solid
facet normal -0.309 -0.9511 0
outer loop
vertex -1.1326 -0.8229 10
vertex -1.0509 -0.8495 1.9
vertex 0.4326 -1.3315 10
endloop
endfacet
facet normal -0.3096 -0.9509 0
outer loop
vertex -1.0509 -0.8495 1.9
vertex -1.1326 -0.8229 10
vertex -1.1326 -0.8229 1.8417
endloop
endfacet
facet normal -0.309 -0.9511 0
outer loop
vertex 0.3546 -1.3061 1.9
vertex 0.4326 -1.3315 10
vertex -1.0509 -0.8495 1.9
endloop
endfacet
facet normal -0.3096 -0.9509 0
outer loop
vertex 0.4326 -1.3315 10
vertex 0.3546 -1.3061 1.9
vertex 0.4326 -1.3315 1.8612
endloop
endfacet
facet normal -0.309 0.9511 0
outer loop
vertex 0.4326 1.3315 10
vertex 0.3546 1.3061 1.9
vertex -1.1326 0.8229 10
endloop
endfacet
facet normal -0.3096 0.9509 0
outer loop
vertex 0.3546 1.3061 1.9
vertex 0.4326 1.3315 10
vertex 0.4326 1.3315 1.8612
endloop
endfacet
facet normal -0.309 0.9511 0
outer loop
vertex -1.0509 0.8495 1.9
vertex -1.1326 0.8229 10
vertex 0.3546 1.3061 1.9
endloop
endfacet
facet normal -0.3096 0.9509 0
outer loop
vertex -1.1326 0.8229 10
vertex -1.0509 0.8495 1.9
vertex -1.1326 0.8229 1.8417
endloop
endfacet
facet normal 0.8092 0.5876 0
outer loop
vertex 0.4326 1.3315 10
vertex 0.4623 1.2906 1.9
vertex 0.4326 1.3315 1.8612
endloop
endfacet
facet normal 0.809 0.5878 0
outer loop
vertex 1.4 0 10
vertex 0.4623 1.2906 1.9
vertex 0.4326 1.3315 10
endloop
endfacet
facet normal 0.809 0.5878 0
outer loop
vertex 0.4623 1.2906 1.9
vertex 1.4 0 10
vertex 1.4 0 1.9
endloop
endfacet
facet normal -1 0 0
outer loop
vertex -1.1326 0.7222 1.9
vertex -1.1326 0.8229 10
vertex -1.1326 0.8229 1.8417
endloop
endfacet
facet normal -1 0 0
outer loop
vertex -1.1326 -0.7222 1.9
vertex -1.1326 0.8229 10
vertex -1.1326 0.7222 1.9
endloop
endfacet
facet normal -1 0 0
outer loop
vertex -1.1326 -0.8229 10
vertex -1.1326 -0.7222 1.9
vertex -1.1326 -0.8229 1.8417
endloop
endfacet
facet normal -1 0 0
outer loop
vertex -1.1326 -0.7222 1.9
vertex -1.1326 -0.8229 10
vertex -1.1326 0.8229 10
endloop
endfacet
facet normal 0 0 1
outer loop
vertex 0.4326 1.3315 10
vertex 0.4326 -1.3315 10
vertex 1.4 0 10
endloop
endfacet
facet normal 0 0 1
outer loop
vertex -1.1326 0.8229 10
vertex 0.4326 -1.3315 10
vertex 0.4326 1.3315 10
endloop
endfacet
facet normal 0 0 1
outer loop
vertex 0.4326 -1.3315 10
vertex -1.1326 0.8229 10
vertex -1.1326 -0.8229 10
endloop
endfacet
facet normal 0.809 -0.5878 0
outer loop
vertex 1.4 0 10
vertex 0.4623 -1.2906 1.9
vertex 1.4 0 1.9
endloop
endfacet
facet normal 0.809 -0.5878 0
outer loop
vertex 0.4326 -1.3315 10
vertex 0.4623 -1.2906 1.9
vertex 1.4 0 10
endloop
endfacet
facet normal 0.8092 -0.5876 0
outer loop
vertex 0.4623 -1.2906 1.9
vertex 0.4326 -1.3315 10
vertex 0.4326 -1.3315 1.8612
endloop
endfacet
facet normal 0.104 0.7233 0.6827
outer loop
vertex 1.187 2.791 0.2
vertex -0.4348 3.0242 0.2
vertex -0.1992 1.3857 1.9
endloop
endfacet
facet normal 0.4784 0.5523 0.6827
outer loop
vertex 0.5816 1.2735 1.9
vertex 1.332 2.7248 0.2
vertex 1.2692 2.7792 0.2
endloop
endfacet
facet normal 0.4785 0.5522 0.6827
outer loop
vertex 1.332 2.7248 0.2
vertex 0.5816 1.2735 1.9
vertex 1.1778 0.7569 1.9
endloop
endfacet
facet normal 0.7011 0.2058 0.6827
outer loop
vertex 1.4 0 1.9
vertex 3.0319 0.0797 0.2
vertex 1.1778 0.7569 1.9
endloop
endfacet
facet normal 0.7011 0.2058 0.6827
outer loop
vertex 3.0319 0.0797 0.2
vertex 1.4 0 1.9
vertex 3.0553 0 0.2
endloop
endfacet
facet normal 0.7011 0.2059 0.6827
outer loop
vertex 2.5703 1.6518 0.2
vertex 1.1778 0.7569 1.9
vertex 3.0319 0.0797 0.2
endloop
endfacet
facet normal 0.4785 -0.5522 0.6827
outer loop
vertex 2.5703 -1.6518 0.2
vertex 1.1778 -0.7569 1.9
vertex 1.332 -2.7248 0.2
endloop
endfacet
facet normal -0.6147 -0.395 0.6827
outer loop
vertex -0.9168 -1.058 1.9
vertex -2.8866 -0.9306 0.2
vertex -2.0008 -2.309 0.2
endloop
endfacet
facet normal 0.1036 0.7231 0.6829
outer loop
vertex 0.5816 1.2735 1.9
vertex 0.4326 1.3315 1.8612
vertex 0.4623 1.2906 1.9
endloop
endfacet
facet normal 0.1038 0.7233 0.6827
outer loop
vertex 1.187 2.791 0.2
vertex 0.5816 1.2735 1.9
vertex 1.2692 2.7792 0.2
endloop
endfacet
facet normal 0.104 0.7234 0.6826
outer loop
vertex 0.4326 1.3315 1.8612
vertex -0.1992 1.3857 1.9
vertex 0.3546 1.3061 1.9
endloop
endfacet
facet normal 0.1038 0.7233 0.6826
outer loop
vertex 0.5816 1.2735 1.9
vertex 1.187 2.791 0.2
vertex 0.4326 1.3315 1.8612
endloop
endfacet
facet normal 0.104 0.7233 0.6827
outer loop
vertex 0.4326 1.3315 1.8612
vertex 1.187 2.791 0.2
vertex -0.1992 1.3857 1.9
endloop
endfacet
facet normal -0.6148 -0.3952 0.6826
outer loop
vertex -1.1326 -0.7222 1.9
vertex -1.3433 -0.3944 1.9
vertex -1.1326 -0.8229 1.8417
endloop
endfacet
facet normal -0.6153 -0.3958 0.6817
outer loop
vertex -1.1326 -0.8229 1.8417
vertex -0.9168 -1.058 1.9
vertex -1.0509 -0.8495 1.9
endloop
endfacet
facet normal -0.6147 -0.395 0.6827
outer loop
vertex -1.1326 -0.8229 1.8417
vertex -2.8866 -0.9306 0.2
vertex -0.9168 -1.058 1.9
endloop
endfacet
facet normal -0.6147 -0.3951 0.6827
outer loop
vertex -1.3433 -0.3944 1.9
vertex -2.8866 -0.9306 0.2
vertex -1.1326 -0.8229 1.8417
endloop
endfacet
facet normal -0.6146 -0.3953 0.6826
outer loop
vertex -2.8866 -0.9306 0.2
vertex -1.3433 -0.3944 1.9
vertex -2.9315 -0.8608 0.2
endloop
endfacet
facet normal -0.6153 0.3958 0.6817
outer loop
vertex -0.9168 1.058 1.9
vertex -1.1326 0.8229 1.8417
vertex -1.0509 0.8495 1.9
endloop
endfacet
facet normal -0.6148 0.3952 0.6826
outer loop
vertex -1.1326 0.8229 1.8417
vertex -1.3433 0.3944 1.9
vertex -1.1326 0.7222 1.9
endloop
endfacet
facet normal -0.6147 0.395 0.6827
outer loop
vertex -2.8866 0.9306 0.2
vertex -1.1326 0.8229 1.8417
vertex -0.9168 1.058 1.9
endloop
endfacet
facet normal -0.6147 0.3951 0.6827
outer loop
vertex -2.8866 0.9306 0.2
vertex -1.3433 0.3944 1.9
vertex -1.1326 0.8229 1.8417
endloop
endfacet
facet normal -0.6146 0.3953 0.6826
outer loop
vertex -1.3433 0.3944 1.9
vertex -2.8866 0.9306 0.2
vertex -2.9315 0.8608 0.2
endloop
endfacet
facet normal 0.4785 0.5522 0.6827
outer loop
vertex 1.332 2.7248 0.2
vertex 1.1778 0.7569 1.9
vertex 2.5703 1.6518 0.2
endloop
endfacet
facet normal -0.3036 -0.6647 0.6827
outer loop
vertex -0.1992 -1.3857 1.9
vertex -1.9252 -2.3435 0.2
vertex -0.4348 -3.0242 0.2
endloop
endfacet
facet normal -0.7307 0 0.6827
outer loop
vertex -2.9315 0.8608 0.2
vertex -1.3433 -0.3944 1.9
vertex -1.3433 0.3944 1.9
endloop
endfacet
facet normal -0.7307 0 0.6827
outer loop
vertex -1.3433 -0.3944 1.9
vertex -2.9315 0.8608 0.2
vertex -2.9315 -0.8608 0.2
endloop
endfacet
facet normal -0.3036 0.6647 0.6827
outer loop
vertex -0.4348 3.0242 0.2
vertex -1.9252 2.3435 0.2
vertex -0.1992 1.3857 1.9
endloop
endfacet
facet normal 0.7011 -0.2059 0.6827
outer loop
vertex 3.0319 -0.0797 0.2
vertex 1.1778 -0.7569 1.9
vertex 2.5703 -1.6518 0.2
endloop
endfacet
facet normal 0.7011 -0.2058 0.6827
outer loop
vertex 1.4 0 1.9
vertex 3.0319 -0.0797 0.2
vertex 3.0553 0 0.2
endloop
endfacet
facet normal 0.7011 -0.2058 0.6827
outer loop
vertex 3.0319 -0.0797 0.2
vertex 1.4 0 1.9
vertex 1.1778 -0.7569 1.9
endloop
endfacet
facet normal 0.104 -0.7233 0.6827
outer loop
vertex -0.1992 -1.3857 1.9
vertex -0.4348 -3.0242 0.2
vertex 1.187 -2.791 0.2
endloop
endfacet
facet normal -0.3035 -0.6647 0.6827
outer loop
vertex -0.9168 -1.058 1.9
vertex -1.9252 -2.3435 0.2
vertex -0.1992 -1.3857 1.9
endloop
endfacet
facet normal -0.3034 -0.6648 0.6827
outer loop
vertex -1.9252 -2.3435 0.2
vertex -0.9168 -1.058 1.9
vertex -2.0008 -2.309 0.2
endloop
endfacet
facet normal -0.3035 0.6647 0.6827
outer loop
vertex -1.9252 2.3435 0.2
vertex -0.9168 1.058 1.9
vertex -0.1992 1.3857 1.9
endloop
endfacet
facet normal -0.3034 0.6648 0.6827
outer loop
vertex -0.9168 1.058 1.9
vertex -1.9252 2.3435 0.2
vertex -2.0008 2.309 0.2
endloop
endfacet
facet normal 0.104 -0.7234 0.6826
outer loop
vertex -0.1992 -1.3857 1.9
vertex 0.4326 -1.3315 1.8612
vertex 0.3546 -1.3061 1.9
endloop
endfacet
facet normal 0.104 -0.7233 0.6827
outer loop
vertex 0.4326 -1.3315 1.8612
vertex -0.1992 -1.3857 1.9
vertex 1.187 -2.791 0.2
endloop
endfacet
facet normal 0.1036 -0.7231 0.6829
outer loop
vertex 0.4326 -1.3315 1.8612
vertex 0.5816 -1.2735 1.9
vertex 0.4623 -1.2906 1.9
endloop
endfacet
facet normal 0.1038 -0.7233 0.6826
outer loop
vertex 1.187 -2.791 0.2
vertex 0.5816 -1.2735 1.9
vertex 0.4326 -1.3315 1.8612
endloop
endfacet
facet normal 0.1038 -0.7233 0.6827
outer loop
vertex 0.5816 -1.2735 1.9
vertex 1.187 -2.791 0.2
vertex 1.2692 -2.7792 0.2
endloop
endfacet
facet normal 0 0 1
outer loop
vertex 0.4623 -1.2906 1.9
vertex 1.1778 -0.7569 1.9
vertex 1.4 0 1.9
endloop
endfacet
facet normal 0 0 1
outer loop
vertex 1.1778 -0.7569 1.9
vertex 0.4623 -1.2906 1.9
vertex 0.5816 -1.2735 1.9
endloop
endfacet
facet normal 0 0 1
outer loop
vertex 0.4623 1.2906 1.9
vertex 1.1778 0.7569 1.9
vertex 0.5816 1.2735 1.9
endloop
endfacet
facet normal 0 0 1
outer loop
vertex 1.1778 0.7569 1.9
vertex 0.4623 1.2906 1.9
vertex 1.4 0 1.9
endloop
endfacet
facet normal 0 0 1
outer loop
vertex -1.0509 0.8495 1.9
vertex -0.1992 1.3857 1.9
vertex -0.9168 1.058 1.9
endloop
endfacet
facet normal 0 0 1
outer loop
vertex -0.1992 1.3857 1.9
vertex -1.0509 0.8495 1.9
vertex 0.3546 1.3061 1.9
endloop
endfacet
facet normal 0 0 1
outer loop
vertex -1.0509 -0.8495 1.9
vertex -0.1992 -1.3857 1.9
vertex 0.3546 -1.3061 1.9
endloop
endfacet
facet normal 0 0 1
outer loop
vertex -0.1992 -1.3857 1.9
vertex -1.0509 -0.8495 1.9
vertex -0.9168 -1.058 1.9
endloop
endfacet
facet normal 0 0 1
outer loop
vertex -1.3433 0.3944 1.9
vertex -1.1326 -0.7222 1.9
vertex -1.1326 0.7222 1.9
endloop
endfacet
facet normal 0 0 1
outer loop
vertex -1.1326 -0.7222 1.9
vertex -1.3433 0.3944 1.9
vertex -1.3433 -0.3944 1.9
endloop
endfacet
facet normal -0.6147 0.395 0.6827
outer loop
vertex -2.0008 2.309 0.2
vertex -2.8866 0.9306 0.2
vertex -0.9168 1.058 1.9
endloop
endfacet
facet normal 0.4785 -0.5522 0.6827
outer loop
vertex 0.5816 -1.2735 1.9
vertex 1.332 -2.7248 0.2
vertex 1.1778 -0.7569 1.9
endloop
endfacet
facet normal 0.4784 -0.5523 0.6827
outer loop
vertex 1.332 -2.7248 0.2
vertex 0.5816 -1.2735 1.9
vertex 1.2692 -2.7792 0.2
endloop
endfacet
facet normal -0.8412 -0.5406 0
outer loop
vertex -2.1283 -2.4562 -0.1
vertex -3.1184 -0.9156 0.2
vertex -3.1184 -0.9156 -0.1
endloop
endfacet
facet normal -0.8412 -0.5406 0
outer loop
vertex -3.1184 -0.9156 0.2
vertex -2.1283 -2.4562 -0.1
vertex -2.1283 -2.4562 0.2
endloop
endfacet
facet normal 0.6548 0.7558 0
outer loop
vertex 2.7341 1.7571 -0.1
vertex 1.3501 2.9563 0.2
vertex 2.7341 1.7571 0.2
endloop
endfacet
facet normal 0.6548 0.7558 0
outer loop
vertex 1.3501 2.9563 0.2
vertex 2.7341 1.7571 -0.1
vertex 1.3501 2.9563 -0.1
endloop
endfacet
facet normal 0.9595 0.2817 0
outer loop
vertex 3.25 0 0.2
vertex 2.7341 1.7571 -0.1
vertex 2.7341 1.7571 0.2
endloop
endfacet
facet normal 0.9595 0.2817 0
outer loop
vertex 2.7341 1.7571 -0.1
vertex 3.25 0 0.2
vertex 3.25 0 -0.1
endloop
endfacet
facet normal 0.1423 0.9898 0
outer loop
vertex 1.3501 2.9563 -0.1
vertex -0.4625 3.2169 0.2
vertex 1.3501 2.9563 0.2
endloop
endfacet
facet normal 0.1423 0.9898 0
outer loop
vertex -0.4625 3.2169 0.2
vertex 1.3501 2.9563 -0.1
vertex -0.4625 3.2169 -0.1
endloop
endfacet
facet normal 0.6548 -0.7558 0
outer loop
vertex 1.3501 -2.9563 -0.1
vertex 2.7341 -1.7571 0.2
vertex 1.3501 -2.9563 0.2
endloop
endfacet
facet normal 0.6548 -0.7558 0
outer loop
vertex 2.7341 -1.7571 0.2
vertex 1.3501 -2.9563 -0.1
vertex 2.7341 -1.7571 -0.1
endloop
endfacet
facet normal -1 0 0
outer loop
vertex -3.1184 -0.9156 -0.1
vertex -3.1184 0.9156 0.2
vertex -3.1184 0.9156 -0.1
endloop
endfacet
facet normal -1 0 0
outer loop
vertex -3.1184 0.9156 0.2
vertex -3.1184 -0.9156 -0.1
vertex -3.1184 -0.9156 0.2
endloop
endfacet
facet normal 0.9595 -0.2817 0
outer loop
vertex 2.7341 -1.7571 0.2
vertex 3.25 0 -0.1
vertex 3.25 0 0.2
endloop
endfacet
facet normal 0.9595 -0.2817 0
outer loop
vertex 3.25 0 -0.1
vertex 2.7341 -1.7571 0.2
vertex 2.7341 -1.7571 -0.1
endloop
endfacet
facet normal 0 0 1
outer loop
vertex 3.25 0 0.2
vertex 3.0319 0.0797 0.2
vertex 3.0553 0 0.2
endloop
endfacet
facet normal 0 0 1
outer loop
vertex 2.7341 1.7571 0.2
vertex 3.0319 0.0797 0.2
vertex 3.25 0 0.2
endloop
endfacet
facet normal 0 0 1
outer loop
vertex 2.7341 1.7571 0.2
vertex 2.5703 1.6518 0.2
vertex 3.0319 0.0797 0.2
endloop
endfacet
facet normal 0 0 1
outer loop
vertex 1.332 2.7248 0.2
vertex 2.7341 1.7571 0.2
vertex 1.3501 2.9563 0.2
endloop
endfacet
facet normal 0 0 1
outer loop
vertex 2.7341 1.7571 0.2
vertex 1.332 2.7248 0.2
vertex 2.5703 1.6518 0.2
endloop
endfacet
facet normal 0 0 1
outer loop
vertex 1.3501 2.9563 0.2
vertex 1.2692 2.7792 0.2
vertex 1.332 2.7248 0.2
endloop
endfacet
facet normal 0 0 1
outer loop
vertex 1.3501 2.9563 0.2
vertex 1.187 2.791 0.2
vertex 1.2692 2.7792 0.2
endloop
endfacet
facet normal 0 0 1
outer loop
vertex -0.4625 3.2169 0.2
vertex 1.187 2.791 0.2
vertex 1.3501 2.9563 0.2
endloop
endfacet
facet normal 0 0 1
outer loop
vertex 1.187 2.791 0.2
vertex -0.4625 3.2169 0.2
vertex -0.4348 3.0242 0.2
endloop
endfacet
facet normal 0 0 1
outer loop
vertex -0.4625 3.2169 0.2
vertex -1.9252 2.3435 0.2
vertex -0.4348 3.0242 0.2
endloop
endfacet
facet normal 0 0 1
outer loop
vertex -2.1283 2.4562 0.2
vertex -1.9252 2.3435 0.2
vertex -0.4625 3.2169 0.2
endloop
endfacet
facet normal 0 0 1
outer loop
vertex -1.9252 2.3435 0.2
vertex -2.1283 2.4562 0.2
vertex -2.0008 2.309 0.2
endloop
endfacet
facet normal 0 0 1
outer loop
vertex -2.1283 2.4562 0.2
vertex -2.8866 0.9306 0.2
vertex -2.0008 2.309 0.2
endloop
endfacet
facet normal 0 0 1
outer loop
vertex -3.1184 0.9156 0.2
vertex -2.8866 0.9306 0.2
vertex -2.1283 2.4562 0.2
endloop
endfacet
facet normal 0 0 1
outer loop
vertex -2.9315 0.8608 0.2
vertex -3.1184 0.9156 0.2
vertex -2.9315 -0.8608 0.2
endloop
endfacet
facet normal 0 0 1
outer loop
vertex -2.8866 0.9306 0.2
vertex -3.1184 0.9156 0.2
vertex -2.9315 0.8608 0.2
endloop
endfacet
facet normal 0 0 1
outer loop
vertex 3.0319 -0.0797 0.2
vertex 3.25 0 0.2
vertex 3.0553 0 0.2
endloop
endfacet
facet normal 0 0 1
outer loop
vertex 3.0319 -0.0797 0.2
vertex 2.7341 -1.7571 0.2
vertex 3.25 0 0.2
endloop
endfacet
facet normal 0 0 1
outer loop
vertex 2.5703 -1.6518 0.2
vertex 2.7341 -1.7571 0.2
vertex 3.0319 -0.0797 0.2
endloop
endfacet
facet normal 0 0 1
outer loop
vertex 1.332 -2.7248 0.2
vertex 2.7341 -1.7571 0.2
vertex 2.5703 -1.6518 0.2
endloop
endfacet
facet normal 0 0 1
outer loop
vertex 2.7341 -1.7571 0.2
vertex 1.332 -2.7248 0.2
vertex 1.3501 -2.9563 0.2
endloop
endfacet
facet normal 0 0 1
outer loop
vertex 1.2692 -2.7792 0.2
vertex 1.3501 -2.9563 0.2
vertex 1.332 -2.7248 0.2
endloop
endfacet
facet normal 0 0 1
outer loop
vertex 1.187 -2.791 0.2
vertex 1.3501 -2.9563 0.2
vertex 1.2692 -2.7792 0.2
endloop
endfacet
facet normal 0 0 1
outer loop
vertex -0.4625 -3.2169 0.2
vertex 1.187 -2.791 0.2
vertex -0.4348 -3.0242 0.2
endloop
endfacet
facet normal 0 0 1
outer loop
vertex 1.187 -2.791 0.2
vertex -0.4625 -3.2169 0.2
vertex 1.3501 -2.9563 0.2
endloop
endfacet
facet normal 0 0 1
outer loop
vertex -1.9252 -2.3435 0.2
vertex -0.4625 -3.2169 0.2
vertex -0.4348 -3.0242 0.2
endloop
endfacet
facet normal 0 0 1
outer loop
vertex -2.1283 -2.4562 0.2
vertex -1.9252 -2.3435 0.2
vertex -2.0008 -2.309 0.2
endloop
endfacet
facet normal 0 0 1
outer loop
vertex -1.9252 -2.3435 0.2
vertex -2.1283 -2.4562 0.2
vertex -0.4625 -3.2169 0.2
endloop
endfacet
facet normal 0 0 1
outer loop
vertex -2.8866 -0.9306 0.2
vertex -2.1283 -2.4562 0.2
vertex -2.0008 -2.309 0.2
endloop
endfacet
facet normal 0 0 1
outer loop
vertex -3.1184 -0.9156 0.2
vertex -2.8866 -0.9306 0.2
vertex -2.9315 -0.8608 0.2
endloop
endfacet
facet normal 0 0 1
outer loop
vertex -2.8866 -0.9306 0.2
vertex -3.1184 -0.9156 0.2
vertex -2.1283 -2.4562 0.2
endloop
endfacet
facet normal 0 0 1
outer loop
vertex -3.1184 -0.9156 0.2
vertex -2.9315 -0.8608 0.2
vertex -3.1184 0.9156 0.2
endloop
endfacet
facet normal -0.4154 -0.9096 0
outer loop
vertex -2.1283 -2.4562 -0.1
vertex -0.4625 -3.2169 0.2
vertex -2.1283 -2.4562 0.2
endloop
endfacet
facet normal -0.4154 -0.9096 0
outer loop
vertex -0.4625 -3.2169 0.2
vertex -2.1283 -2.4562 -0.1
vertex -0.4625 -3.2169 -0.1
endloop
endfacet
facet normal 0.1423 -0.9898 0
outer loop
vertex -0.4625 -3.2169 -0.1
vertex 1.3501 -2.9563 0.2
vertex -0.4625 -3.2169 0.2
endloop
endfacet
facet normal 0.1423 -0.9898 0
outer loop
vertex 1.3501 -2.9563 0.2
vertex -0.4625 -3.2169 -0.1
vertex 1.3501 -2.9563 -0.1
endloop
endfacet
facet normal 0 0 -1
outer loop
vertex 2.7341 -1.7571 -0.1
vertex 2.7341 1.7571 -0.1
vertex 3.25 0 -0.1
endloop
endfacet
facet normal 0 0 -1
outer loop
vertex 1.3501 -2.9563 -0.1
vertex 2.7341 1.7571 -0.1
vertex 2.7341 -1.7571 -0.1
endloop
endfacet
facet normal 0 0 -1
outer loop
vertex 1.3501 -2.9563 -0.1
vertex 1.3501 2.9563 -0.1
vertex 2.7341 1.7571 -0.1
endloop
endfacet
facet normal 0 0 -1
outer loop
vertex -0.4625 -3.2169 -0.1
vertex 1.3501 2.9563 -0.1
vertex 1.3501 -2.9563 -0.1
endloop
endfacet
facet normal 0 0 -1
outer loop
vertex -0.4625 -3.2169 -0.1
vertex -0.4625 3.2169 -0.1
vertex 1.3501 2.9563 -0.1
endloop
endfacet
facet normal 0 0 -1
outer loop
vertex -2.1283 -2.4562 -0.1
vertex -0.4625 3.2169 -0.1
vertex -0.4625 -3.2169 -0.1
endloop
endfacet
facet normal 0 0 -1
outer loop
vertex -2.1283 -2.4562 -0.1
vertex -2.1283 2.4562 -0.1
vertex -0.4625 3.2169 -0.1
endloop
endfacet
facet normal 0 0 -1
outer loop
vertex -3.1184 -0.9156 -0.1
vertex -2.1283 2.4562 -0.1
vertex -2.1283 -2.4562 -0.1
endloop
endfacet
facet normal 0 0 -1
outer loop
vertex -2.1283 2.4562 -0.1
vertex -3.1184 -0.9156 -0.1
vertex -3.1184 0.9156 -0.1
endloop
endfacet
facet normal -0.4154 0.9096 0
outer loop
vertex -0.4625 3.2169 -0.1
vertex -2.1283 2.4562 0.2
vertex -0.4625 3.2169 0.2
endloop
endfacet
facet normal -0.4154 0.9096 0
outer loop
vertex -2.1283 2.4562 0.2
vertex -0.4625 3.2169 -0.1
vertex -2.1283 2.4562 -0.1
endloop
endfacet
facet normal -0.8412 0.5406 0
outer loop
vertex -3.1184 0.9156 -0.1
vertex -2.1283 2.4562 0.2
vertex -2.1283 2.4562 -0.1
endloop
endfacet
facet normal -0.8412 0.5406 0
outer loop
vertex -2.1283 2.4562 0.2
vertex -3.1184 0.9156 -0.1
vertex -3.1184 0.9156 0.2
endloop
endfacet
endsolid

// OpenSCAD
// file: tunable_constants.scad
// Change parameters to fit your printer and slicer differences

C_M3_DIAMETER = 3.1; // size of a hole that a M3 screw will slide through
C_M3_DIAMETER_THREAD = 2.8; // size of a hole that a M3 screw will create own threads in

C_M3_NUT = 7;

C_M4_NUT = 8.4;

C_M4_DIAMETER = 4.1; // size of a hole that a M4 screw will slide through
C_M4_DIAMETER_THREAD = 3.8; // size of a hole that a M4 screw will create own threads in

b_12mm_tol = 0.3; // tolerance for bearing with 12mm diameter

C_12MM_BEARING_D = 12+b_12mm_tol; // Size of a hole that hold a 12mm bearing
C_12MM_BEARING_H = 3.5;

C_8MM_LOOSE = 8.7; // Loose fitting that will guarantie that it will not touch
C_8MM_TIGHT = 8.2; // Tight fitting for indrive etc
C_8MM_FIT = 8.5; // Perfect fit for it to be removable but not by much force, used for left wheel mount
// main file
include <tunable_constants.scad>;
common_flat_screw_tap();
module common_flat_screw_tap(l = 10, l2 = 0) {
    // l2 is amount of the screw that are bigger for sliding through the hole
    tap_z = 1.9;
    union() {
        cylinder(d = C_M3_DIAMETER_THREAD, h= l);
        cylinder(d = C_M3_DIAMETER, h= l2);
        translate([0,0,-0.1+0.1]) cylinder(d1 = 6.5, d2= C_M3_DIAMETER_THREAD, h= tap_z);
        translate([0,0,-0.1]) cylinder(d = 6.5, h= 0.3);
    }
}

module common_button_screw_tap(l = 10, l2 = 0) {
    
    tap_z = 1.1;
    union() {
        cylinder(d = C_M3_DIAMETER_THREAD, h= l);
        cylinder(d = C_M3_DIAMETER, h= l2);
        translate([0,0,-4]) cylinder(d = 6, h=4);
    }
}

module roundedcube(xdim ,ydim ,zdim,rdim){
    hull(){
        fn=30;
        translate([rdim,rdim,0]) cylinder(r=rdim, h=zdim, $fn=fn);
        translate([xdim-rdim,rdim,0])cylinder(r=rdim, h=zdim, $fn=fn);

        translate([rdim,ydim-rdim,0]) cylinder(r=rdim, h=zdim, $fn=fn);
        translate([xdim-rdim,ydim-rdim,0]) cylinder(r=rdim, h=zdim, $fn=fn);
    }
}
